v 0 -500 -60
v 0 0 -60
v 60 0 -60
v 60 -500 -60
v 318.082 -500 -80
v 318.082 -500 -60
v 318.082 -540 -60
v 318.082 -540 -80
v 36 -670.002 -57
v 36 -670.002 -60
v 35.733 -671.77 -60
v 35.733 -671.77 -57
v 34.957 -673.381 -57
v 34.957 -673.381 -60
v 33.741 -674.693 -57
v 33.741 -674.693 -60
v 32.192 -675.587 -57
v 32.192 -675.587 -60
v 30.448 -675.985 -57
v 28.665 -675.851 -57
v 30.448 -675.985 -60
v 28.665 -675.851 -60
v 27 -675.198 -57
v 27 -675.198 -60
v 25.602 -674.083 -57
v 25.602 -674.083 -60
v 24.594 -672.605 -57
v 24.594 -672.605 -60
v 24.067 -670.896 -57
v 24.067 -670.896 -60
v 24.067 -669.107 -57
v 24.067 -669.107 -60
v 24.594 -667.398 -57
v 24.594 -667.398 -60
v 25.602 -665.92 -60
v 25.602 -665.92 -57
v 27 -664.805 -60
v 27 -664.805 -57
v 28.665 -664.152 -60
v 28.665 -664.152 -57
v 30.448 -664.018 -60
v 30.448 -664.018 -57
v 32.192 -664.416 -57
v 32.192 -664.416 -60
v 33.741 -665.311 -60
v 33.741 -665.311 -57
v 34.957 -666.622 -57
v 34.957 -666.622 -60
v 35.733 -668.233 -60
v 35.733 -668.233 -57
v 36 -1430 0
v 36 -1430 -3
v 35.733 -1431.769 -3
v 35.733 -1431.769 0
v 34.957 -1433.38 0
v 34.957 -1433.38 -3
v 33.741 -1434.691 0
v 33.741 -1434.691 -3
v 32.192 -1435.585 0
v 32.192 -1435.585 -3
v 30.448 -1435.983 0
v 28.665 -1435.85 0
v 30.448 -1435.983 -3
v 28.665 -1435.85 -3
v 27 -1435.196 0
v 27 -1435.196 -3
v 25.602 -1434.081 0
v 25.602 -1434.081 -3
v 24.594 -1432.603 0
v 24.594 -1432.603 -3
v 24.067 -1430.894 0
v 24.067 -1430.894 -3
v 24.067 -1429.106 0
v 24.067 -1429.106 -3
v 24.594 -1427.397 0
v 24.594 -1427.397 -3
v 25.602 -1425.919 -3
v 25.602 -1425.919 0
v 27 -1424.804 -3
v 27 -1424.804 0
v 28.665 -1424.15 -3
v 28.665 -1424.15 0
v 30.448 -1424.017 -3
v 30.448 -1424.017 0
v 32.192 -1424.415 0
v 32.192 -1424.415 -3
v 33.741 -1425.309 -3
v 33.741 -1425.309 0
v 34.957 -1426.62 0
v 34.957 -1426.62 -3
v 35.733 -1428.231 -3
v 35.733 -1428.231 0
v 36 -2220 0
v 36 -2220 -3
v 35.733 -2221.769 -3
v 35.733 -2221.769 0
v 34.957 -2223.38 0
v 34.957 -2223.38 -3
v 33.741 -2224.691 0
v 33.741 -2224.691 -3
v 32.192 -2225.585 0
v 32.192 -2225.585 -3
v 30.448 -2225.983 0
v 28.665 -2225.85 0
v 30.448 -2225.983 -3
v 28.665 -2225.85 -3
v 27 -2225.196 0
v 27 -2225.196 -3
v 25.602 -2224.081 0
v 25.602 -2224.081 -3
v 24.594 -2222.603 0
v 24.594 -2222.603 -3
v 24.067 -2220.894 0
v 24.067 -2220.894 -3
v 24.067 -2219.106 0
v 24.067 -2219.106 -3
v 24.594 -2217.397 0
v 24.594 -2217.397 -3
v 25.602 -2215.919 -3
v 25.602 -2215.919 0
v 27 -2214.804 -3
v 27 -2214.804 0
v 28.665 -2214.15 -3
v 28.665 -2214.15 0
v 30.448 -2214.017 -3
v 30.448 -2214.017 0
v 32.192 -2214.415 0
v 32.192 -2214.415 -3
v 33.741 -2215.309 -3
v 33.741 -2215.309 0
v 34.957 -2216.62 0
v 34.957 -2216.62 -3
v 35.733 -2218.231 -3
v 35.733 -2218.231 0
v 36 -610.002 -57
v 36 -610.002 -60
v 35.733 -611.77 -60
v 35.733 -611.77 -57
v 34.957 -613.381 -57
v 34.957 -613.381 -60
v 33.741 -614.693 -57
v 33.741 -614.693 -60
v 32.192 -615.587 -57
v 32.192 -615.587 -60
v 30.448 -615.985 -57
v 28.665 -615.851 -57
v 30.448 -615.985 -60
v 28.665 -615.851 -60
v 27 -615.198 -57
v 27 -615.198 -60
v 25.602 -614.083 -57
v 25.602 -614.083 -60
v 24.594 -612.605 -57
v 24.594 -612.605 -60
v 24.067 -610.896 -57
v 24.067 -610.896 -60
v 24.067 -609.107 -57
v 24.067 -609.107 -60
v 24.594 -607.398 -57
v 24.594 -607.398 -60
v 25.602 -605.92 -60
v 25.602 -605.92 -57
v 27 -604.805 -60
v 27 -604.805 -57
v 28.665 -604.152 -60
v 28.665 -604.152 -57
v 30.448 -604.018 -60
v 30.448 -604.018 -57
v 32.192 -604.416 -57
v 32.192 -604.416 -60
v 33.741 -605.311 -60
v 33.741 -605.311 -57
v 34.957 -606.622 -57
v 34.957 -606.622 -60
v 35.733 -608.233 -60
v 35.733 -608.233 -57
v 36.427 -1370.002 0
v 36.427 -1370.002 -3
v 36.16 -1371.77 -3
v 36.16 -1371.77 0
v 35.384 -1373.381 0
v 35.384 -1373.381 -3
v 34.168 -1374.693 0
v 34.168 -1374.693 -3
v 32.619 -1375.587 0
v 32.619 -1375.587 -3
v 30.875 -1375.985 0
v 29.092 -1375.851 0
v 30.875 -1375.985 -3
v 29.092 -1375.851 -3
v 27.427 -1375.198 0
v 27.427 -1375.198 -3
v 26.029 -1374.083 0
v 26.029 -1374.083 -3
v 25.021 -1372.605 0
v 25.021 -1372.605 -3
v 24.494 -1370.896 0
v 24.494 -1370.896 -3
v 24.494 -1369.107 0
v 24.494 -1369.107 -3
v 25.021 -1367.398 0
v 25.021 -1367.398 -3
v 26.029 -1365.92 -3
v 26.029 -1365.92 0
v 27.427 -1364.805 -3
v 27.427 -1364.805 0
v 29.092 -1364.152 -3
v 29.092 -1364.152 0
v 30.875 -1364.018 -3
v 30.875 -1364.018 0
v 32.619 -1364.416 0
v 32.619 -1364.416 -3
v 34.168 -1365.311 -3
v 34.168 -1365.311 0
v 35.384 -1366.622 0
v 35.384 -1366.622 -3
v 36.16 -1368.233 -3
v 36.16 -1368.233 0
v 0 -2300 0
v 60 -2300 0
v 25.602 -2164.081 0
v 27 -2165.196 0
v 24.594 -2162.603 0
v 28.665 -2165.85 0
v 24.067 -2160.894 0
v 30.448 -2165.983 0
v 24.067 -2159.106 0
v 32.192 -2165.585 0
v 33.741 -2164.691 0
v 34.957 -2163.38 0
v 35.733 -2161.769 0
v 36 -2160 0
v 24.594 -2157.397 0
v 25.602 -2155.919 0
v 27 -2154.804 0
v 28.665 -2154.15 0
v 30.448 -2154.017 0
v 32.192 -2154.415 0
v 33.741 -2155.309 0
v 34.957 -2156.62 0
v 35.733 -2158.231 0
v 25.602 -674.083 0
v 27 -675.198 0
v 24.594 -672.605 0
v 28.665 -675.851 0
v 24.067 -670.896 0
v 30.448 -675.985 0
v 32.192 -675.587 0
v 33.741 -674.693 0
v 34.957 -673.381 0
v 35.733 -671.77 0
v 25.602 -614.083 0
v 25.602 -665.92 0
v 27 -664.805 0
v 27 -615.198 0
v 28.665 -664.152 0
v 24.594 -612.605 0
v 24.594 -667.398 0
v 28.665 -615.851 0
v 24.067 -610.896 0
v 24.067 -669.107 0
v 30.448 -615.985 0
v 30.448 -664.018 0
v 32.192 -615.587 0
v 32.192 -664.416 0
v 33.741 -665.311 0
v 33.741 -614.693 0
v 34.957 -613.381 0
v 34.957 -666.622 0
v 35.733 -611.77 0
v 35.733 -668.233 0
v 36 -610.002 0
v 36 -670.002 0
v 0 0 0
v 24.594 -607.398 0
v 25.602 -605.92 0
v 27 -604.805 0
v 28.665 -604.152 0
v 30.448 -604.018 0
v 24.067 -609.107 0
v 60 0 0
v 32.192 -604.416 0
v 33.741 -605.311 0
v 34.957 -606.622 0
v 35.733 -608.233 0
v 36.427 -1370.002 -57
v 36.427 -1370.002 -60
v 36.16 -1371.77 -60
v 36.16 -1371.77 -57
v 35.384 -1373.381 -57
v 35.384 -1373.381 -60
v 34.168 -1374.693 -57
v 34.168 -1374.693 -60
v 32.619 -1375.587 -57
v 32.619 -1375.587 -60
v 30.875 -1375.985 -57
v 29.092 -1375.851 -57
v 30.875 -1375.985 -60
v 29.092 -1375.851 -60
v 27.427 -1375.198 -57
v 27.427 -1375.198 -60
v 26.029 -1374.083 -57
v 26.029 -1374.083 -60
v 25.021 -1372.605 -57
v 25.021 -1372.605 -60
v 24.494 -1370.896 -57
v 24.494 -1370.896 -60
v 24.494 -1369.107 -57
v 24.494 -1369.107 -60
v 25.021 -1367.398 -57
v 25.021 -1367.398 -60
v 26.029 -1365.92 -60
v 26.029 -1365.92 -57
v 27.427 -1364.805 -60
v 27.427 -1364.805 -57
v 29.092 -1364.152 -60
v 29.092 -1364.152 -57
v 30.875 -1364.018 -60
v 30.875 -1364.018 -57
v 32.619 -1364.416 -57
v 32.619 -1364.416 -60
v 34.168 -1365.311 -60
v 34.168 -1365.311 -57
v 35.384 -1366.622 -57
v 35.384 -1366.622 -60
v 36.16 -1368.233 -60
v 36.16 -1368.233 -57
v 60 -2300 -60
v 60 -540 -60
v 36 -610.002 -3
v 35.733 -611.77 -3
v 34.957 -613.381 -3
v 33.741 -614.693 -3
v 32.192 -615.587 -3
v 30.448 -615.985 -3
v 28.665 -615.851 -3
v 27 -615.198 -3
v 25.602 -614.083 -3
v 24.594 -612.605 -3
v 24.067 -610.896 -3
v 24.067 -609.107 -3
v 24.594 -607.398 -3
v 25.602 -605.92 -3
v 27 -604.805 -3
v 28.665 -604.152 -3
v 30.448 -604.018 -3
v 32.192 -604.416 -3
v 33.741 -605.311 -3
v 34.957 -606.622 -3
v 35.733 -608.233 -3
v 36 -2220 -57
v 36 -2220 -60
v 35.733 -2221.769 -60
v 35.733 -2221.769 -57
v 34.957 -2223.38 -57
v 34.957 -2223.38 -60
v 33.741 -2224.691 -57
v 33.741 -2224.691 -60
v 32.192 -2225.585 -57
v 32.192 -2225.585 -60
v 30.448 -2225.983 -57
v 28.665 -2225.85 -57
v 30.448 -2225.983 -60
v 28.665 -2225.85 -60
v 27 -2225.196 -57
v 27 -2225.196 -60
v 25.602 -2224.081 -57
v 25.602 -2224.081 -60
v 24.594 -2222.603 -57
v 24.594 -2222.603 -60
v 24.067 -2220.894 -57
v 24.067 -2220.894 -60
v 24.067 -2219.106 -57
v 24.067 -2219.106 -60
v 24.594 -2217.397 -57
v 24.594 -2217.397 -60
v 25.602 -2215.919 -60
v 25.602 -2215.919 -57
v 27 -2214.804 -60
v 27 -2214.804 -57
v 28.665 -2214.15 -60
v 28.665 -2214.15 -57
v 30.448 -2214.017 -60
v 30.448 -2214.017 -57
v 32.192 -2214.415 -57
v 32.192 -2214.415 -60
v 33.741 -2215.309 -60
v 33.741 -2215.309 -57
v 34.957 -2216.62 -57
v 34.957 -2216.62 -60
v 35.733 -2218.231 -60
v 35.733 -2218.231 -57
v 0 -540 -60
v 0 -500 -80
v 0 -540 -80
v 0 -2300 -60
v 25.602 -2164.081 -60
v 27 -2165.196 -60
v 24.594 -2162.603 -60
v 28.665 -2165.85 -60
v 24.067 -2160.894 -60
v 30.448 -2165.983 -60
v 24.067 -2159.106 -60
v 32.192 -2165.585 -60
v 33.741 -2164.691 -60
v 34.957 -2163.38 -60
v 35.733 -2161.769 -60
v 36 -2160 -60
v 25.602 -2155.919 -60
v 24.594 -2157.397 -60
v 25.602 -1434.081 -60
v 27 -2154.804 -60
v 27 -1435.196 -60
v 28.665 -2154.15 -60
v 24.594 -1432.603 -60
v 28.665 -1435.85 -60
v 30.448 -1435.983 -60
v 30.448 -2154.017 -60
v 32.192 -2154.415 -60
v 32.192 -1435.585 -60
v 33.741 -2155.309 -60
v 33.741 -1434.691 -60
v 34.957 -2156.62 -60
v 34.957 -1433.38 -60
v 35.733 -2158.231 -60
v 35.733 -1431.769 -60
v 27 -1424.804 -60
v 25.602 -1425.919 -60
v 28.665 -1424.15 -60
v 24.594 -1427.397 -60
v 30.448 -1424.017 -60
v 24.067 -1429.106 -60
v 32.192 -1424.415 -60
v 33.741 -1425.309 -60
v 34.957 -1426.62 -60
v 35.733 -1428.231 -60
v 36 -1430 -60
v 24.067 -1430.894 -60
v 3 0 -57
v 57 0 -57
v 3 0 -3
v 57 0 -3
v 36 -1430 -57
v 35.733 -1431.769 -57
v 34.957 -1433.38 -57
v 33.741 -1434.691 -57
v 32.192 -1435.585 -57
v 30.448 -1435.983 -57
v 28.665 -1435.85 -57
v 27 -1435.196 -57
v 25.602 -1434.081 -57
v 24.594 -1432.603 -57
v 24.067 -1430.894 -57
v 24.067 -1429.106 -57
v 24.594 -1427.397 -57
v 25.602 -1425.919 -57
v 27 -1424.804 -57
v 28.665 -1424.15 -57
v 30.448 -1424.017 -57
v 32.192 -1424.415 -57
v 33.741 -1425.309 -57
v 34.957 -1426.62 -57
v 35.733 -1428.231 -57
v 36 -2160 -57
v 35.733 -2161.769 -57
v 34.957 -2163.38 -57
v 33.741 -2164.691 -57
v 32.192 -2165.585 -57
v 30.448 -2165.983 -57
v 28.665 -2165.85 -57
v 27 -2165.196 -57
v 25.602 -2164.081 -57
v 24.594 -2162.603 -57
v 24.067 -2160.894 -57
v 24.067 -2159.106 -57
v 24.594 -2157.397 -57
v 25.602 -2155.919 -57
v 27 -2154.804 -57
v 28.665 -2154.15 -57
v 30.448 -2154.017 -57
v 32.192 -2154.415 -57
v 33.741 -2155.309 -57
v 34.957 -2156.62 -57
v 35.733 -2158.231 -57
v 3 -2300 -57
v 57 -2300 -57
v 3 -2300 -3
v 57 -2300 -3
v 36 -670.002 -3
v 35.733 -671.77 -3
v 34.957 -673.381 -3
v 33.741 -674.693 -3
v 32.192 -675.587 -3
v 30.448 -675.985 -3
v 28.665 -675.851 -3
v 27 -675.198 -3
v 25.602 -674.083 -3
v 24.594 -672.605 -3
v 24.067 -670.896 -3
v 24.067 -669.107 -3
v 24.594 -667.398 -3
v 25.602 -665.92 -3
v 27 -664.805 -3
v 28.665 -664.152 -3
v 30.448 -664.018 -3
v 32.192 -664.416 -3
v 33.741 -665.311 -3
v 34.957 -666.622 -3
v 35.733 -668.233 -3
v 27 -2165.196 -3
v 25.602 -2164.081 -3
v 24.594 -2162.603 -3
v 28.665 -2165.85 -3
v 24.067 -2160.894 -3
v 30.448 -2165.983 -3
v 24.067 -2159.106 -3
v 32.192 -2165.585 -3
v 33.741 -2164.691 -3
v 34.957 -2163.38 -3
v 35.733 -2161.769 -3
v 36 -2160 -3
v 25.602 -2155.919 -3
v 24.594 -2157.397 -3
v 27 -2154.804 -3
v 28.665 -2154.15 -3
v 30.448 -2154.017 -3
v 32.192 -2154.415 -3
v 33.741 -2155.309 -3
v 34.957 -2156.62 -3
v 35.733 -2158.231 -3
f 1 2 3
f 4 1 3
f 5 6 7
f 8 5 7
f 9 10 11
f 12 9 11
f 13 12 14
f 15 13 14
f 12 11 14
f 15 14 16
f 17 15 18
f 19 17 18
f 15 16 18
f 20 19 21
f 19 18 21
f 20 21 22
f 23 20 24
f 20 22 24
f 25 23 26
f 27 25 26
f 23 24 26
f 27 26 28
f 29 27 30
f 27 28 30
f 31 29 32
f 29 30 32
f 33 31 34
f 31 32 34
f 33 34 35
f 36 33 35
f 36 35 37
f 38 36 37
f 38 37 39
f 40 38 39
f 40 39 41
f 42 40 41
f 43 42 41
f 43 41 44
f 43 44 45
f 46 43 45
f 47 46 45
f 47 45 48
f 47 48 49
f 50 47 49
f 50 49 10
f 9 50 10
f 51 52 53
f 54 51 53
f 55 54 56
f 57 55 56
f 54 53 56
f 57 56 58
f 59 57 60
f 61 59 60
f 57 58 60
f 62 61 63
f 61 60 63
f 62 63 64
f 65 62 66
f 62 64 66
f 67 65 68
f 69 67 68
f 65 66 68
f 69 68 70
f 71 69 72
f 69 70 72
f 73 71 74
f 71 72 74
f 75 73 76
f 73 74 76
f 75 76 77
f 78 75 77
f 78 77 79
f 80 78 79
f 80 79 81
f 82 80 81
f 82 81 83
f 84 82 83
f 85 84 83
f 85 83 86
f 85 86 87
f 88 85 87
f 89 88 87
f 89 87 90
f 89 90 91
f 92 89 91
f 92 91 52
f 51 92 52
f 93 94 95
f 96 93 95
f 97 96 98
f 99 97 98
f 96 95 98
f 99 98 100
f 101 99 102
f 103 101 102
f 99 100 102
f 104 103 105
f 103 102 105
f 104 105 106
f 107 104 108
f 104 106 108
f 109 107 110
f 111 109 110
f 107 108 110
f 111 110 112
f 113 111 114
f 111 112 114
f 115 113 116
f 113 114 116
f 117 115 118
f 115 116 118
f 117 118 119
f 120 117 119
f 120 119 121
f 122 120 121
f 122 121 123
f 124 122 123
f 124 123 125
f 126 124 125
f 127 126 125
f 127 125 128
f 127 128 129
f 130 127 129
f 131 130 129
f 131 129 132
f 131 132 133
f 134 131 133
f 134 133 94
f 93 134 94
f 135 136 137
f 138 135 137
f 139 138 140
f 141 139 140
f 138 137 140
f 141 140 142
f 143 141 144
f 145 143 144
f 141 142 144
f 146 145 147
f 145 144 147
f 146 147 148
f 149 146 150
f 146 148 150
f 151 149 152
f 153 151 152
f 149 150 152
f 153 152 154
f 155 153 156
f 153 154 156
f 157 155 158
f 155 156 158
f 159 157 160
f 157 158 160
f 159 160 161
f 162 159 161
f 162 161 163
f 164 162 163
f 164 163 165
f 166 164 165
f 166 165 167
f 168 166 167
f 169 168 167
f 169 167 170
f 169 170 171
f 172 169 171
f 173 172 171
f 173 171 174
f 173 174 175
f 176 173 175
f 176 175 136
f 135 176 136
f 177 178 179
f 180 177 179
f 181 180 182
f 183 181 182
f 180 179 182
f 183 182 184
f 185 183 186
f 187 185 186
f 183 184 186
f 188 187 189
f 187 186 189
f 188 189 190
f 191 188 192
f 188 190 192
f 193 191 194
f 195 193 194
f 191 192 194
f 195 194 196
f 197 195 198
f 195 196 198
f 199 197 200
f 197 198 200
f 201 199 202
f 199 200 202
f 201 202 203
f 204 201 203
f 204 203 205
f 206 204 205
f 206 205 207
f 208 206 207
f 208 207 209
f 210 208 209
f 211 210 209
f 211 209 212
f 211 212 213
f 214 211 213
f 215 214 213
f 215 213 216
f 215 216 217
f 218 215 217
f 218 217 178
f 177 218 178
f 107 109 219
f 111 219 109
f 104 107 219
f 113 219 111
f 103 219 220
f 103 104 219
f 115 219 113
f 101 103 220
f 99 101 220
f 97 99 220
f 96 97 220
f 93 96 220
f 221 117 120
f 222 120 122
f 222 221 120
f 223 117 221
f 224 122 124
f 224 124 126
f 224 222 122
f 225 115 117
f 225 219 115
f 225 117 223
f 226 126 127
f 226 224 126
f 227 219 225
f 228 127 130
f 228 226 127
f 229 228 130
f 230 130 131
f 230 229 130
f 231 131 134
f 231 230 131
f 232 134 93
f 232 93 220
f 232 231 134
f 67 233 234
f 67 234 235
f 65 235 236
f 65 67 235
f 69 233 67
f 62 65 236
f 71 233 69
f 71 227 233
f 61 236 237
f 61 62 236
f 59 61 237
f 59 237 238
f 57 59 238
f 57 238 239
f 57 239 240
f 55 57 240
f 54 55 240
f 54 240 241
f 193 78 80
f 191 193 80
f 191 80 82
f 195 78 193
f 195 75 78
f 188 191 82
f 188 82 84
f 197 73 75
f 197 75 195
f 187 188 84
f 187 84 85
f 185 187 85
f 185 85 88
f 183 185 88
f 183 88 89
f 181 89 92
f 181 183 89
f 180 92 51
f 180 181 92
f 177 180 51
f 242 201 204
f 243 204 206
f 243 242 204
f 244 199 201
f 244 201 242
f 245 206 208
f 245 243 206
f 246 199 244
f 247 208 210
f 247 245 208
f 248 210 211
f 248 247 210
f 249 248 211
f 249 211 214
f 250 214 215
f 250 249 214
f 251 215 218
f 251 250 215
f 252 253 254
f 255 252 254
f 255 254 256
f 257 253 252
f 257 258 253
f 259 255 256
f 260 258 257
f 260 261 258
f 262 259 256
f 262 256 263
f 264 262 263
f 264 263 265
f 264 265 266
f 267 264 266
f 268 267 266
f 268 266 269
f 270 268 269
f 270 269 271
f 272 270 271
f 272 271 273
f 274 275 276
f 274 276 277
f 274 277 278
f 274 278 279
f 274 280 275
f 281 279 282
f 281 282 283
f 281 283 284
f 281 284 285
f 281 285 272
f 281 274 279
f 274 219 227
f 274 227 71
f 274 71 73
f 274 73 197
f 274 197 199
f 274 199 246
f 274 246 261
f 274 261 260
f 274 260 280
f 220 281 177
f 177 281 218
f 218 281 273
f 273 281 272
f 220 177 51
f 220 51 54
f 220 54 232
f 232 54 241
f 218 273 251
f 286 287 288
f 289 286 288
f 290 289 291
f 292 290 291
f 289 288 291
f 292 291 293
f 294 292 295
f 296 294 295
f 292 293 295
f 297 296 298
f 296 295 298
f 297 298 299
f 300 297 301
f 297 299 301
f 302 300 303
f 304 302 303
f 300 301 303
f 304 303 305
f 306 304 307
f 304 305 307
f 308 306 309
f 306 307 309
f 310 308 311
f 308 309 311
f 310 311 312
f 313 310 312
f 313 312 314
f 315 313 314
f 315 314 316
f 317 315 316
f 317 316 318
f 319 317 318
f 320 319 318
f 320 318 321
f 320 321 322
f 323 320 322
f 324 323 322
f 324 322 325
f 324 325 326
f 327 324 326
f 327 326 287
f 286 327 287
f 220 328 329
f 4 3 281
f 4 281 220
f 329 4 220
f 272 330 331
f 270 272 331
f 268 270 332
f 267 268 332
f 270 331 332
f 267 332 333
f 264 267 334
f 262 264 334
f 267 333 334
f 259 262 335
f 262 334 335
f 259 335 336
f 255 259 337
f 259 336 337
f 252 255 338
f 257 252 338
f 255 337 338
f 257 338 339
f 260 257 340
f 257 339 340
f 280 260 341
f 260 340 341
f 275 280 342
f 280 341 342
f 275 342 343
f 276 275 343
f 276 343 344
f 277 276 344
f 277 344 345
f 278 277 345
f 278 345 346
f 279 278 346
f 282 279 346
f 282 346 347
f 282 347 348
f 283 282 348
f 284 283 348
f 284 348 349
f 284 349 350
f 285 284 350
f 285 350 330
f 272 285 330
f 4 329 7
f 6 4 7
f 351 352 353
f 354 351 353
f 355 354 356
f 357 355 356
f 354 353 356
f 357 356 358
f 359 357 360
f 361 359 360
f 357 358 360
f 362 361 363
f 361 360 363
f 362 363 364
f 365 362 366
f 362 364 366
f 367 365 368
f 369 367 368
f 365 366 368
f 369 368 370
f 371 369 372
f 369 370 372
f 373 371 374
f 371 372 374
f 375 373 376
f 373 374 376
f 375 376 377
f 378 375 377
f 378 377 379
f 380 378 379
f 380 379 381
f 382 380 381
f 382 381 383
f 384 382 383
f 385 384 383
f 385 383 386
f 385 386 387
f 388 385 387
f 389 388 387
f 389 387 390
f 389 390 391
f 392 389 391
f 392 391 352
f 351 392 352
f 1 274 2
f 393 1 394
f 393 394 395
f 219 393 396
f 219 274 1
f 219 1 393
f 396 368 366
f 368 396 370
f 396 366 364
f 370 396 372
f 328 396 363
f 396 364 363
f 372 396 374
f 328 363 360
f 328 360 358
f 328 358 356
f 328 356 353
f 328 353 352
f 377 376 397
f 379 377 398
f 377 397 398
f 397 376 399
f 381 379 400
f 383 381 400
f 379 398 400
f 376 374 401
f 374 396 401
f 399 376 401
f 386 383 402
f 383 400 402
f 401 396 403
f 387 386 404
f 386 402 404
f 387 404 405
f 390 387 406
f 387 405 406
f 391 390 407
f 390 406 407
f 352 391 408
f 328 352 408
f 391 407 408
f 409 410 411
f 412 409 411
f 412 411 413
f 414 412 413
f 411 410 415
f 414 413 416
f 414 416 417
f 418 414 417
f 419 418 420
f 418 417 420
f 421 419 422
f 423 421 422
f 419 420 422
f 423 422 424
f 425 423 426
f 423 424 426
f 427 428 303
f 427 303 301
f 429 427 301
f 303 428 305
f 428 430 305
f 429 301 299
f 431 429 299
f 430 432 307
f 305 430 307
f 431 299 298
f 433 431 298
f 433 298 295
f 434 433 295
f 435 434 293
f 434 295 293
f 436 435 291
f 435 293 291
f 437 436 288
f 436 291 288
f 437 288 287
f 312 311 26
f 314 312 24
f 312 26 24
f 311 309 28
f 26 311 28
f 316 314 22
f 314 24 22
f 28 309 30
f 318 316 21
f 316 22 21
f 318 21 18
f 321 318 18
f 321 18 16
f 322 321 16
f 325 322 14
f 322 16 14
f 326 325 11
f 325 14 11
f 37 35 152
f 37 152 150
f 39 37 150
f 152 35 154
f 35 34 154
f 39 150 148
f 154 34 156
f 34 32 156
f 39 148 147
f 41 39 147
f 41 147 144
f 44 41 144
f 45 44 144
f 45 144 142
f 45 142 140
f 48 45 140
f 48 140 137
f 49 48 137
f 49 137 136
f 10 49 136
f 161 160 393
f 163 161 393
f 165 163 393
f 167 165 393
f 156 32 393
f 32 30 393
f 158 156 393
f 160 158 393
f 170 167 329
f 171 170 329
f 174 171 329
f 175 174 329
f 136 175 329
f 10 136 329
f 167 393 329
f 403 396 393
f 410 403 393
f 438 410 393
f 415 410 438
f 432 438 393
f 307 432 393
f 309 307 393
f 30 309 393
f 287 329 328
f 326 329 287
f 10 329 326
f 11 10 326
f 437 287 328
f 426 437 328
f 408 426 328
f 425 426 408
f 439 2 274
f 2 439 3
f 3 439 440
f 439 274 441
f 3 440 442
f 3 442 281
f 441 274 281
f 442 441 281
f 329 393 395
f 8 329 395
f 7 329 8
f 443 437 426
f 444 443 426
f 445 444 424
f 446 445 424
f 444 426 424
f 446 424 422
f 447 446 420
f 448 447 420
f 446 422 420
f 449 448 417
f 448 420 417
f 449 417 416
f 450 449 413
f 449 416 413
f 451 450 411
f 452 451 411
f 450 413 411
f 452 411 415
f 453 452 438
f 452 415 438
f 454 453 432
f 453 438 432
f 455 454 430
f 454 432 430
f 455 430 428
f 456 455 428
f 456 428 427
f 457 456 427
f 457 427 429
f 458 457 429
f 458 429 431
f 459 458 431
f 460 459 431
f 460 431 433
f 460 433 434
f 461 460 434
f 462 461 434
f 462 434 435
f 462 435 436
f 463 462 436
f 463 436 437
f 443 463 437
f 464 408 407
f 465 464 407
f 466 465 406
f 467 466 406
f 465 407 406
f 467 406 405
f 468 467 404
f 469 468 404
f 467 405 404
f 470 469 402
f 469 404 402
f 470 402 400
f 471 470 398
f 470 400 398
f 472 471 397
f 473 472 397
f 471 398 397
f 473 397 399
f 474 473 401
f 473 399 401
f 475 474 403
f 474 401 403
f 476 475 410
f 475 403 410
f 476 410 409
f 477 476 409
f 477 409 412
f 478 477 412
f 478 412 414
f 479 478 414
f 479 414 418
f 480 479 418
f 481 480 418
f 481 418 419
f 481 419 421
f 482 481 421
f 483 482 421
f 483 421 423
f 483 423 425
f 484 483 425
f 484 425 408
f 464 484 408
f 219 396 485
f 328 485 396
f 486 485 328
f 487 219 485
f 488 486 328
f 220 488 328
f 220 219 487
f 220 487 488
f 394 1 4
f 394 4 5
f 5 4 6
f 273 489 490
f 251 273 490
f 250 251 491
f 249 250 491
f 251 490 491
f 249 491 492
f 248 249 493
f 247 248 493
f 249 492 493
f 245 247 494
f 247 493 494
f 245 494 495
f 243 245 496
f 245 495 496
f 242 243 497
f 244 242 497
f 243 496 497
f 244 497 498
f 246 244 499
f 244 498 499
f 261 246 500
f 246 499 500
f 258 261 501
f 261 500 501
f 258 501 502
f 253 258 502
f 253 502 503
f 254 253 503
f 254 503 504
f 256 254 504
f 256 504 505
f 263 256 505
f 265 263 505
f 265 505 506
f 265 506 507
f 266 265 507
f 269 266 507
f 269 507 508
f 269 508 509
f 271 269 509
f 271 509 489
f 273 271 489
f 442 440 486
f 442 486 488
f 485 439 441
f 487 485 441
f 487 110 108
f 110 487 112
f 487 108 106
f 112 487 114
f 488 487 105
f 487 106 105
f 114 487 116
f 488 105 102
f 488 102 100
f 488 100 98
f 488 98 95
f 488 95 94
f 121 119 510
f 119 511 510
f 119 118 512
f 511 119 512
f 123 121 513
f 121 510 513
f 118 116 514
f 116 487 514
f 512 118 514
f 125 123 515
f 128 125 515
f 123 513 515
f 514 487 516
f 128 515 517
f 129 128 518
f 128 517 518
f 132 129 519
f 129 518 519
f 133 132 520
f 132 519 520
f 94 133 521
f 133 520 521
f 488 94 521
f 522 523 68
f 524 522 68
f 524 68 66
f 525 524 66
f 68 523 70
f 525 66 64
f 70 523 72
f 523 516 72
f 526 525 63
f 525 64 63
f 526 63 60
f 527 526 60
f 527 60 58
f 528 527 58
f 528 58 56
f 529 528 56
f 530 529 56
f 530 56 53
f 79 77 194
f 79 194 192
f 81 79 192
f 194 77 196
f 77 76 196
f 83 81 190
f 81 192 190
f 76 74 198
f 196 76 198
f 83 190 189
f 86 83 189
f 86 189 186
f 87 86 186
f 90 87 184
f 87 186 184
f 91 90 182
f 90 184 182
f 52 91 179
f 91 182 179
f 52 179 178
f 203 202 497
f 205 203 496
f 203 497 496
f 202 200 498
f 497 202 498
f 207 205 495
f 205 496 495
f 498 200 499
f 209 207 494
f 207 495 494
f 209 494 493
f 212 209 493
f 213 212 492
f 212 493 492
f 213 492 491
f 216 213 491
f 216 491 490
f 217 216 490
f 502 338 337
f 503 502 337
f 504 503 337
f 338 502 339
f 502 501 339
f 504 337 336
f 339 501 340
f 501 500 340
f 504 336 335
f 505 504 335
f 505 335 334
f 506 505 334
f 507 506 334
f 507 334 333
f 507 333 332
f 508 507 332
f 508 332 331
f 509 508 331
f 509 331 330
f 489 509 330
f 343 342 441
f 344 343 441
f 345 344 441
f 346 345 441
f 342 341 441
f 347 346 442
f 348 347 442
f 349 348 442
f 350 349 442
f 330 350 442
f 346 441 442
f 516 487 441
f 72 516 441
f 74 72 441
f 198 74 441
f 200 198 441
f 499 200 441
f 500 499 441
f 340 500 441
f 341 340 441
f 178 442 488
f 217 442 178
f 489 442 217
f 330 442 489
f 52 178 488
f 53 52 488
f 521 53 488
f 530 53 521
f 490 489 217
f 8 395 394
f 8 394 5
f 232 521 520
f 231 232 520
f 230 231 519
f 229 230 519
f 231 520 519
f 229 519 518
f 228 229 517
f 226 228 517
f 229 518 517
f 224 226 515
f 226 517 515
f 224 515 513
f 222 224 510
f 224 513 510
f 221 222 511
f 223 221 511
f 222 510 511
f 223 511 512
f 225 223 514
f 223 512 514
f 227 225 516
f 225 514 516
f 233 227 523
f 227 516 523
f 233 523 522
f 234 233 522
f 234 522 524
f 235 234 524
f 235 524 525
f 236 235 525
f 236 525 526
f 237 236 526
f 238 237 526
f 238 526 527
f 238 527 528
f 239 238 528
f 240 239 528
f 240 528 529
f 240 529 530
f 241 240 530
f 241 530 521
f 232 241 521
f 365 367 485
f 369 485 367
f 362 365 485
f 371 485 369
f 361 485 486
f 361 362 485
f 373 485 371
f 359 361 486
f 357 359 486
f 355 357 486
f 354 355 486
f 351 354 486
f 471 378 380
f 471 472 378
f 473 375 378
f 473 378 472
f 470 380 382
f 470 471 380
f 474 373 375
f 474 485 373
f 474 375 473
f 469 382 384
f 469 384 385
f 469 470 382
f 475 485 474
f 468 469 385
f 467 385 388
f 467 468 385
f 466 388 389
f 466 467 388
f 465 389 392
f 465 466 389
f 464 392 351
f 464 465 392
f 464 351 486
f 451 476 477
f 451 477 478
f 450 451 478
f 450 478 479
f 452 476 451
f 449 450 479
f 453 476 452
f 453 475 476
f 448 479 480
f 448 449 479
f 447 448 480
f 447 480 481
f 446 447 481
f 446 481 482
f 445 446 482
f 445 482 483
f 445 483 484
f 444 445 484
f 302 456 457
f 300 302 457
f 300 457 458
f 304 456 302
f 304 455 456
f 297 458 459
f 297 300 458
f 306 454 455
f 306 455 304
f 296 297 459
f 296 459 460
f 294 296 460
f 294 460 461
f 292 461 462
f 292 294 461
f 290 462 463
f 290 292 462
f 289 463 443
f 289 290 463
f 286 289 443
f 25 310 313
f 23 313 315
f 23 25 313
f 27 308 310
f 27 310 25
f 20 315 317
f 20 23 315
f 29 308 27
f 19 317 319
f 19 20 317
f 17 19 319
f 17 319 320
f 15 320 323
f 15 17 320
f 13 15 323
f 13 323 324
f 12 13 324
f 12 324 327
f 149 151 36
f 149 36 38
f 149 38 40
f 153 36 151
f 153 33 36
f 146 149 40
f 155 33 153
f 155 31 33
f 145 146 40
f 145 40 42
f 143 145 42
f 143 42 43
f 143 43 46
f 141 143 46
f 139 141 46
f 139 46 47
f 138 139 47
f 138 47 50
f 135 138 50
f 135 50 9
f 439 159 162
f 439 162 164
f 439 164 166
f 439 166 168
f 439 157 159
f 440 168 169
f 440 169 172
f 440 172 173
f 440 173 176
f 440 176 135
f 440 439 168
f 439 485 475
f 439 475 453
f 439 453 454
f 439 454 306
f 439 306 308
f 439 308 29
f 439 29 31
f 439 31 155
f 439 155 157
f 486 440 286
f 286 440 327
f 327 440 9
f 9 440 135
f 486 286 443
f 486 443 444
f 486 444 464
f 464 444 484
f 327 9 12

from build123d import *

# Parameters (mm, degrees)
F0_W     = 60
F0_H     = 60
F0_W_2   = 54
F0_H_2   = 54
F1_DEPTH = 2300
F2_R     = 6
F3_DEPTH = 100
F4_W     = 318.082194
F4_H     = 40
F5_DEPTH = 20


with BuildPart() as f1:
    # F0 (on Front) → F1 (new body)
    with BuildSketch(Plane.XZ):
        with Locations((30, -30)):
            Rectangle(F0_W, F0_H)
        with Locations((30, -30)):
            Rectangle(F0_W_2, F0_H_2, mode=Mode.SUBTRACT)
    extrude(amount=F1_DEPTH)

    # F2 (on face) → F3 (cut)
    with BuildSketch(Plane(origin=(0, 0, -60), x_dir=(1, 0, 0), z_dir=(0, 0, -1))):
        with Locations((30, 610.001519)):
            Circle(F2_R)
        with Locations((30, 670.001519)):
            Circle(F2_R)
        with Locations((30, 1430)):
            Circle(F2_R)
        with Locations((30.426905, 1370.001519)):
            Circle(F2_R)
        with Locations((30, 2220)):
            Circle(F2_R)
        with Locations((30, 2160)):
            Circle(F2_R)
    extrude(amount=-F3_DEPTH, mode=Mode.SUBTRACT)

    # F4 (on face) → F5 (join)
    with BuildSketch(Plane(origin=(0, 0, -60), x_dir=(1, 0, 0), z_dir=(0, 0, -1))):
        with Locations((159.041097, 520)):
            Rectangle(F4_W, F4_H)
    extrude(amount=F5_DEPTH)


solid = f1.part
